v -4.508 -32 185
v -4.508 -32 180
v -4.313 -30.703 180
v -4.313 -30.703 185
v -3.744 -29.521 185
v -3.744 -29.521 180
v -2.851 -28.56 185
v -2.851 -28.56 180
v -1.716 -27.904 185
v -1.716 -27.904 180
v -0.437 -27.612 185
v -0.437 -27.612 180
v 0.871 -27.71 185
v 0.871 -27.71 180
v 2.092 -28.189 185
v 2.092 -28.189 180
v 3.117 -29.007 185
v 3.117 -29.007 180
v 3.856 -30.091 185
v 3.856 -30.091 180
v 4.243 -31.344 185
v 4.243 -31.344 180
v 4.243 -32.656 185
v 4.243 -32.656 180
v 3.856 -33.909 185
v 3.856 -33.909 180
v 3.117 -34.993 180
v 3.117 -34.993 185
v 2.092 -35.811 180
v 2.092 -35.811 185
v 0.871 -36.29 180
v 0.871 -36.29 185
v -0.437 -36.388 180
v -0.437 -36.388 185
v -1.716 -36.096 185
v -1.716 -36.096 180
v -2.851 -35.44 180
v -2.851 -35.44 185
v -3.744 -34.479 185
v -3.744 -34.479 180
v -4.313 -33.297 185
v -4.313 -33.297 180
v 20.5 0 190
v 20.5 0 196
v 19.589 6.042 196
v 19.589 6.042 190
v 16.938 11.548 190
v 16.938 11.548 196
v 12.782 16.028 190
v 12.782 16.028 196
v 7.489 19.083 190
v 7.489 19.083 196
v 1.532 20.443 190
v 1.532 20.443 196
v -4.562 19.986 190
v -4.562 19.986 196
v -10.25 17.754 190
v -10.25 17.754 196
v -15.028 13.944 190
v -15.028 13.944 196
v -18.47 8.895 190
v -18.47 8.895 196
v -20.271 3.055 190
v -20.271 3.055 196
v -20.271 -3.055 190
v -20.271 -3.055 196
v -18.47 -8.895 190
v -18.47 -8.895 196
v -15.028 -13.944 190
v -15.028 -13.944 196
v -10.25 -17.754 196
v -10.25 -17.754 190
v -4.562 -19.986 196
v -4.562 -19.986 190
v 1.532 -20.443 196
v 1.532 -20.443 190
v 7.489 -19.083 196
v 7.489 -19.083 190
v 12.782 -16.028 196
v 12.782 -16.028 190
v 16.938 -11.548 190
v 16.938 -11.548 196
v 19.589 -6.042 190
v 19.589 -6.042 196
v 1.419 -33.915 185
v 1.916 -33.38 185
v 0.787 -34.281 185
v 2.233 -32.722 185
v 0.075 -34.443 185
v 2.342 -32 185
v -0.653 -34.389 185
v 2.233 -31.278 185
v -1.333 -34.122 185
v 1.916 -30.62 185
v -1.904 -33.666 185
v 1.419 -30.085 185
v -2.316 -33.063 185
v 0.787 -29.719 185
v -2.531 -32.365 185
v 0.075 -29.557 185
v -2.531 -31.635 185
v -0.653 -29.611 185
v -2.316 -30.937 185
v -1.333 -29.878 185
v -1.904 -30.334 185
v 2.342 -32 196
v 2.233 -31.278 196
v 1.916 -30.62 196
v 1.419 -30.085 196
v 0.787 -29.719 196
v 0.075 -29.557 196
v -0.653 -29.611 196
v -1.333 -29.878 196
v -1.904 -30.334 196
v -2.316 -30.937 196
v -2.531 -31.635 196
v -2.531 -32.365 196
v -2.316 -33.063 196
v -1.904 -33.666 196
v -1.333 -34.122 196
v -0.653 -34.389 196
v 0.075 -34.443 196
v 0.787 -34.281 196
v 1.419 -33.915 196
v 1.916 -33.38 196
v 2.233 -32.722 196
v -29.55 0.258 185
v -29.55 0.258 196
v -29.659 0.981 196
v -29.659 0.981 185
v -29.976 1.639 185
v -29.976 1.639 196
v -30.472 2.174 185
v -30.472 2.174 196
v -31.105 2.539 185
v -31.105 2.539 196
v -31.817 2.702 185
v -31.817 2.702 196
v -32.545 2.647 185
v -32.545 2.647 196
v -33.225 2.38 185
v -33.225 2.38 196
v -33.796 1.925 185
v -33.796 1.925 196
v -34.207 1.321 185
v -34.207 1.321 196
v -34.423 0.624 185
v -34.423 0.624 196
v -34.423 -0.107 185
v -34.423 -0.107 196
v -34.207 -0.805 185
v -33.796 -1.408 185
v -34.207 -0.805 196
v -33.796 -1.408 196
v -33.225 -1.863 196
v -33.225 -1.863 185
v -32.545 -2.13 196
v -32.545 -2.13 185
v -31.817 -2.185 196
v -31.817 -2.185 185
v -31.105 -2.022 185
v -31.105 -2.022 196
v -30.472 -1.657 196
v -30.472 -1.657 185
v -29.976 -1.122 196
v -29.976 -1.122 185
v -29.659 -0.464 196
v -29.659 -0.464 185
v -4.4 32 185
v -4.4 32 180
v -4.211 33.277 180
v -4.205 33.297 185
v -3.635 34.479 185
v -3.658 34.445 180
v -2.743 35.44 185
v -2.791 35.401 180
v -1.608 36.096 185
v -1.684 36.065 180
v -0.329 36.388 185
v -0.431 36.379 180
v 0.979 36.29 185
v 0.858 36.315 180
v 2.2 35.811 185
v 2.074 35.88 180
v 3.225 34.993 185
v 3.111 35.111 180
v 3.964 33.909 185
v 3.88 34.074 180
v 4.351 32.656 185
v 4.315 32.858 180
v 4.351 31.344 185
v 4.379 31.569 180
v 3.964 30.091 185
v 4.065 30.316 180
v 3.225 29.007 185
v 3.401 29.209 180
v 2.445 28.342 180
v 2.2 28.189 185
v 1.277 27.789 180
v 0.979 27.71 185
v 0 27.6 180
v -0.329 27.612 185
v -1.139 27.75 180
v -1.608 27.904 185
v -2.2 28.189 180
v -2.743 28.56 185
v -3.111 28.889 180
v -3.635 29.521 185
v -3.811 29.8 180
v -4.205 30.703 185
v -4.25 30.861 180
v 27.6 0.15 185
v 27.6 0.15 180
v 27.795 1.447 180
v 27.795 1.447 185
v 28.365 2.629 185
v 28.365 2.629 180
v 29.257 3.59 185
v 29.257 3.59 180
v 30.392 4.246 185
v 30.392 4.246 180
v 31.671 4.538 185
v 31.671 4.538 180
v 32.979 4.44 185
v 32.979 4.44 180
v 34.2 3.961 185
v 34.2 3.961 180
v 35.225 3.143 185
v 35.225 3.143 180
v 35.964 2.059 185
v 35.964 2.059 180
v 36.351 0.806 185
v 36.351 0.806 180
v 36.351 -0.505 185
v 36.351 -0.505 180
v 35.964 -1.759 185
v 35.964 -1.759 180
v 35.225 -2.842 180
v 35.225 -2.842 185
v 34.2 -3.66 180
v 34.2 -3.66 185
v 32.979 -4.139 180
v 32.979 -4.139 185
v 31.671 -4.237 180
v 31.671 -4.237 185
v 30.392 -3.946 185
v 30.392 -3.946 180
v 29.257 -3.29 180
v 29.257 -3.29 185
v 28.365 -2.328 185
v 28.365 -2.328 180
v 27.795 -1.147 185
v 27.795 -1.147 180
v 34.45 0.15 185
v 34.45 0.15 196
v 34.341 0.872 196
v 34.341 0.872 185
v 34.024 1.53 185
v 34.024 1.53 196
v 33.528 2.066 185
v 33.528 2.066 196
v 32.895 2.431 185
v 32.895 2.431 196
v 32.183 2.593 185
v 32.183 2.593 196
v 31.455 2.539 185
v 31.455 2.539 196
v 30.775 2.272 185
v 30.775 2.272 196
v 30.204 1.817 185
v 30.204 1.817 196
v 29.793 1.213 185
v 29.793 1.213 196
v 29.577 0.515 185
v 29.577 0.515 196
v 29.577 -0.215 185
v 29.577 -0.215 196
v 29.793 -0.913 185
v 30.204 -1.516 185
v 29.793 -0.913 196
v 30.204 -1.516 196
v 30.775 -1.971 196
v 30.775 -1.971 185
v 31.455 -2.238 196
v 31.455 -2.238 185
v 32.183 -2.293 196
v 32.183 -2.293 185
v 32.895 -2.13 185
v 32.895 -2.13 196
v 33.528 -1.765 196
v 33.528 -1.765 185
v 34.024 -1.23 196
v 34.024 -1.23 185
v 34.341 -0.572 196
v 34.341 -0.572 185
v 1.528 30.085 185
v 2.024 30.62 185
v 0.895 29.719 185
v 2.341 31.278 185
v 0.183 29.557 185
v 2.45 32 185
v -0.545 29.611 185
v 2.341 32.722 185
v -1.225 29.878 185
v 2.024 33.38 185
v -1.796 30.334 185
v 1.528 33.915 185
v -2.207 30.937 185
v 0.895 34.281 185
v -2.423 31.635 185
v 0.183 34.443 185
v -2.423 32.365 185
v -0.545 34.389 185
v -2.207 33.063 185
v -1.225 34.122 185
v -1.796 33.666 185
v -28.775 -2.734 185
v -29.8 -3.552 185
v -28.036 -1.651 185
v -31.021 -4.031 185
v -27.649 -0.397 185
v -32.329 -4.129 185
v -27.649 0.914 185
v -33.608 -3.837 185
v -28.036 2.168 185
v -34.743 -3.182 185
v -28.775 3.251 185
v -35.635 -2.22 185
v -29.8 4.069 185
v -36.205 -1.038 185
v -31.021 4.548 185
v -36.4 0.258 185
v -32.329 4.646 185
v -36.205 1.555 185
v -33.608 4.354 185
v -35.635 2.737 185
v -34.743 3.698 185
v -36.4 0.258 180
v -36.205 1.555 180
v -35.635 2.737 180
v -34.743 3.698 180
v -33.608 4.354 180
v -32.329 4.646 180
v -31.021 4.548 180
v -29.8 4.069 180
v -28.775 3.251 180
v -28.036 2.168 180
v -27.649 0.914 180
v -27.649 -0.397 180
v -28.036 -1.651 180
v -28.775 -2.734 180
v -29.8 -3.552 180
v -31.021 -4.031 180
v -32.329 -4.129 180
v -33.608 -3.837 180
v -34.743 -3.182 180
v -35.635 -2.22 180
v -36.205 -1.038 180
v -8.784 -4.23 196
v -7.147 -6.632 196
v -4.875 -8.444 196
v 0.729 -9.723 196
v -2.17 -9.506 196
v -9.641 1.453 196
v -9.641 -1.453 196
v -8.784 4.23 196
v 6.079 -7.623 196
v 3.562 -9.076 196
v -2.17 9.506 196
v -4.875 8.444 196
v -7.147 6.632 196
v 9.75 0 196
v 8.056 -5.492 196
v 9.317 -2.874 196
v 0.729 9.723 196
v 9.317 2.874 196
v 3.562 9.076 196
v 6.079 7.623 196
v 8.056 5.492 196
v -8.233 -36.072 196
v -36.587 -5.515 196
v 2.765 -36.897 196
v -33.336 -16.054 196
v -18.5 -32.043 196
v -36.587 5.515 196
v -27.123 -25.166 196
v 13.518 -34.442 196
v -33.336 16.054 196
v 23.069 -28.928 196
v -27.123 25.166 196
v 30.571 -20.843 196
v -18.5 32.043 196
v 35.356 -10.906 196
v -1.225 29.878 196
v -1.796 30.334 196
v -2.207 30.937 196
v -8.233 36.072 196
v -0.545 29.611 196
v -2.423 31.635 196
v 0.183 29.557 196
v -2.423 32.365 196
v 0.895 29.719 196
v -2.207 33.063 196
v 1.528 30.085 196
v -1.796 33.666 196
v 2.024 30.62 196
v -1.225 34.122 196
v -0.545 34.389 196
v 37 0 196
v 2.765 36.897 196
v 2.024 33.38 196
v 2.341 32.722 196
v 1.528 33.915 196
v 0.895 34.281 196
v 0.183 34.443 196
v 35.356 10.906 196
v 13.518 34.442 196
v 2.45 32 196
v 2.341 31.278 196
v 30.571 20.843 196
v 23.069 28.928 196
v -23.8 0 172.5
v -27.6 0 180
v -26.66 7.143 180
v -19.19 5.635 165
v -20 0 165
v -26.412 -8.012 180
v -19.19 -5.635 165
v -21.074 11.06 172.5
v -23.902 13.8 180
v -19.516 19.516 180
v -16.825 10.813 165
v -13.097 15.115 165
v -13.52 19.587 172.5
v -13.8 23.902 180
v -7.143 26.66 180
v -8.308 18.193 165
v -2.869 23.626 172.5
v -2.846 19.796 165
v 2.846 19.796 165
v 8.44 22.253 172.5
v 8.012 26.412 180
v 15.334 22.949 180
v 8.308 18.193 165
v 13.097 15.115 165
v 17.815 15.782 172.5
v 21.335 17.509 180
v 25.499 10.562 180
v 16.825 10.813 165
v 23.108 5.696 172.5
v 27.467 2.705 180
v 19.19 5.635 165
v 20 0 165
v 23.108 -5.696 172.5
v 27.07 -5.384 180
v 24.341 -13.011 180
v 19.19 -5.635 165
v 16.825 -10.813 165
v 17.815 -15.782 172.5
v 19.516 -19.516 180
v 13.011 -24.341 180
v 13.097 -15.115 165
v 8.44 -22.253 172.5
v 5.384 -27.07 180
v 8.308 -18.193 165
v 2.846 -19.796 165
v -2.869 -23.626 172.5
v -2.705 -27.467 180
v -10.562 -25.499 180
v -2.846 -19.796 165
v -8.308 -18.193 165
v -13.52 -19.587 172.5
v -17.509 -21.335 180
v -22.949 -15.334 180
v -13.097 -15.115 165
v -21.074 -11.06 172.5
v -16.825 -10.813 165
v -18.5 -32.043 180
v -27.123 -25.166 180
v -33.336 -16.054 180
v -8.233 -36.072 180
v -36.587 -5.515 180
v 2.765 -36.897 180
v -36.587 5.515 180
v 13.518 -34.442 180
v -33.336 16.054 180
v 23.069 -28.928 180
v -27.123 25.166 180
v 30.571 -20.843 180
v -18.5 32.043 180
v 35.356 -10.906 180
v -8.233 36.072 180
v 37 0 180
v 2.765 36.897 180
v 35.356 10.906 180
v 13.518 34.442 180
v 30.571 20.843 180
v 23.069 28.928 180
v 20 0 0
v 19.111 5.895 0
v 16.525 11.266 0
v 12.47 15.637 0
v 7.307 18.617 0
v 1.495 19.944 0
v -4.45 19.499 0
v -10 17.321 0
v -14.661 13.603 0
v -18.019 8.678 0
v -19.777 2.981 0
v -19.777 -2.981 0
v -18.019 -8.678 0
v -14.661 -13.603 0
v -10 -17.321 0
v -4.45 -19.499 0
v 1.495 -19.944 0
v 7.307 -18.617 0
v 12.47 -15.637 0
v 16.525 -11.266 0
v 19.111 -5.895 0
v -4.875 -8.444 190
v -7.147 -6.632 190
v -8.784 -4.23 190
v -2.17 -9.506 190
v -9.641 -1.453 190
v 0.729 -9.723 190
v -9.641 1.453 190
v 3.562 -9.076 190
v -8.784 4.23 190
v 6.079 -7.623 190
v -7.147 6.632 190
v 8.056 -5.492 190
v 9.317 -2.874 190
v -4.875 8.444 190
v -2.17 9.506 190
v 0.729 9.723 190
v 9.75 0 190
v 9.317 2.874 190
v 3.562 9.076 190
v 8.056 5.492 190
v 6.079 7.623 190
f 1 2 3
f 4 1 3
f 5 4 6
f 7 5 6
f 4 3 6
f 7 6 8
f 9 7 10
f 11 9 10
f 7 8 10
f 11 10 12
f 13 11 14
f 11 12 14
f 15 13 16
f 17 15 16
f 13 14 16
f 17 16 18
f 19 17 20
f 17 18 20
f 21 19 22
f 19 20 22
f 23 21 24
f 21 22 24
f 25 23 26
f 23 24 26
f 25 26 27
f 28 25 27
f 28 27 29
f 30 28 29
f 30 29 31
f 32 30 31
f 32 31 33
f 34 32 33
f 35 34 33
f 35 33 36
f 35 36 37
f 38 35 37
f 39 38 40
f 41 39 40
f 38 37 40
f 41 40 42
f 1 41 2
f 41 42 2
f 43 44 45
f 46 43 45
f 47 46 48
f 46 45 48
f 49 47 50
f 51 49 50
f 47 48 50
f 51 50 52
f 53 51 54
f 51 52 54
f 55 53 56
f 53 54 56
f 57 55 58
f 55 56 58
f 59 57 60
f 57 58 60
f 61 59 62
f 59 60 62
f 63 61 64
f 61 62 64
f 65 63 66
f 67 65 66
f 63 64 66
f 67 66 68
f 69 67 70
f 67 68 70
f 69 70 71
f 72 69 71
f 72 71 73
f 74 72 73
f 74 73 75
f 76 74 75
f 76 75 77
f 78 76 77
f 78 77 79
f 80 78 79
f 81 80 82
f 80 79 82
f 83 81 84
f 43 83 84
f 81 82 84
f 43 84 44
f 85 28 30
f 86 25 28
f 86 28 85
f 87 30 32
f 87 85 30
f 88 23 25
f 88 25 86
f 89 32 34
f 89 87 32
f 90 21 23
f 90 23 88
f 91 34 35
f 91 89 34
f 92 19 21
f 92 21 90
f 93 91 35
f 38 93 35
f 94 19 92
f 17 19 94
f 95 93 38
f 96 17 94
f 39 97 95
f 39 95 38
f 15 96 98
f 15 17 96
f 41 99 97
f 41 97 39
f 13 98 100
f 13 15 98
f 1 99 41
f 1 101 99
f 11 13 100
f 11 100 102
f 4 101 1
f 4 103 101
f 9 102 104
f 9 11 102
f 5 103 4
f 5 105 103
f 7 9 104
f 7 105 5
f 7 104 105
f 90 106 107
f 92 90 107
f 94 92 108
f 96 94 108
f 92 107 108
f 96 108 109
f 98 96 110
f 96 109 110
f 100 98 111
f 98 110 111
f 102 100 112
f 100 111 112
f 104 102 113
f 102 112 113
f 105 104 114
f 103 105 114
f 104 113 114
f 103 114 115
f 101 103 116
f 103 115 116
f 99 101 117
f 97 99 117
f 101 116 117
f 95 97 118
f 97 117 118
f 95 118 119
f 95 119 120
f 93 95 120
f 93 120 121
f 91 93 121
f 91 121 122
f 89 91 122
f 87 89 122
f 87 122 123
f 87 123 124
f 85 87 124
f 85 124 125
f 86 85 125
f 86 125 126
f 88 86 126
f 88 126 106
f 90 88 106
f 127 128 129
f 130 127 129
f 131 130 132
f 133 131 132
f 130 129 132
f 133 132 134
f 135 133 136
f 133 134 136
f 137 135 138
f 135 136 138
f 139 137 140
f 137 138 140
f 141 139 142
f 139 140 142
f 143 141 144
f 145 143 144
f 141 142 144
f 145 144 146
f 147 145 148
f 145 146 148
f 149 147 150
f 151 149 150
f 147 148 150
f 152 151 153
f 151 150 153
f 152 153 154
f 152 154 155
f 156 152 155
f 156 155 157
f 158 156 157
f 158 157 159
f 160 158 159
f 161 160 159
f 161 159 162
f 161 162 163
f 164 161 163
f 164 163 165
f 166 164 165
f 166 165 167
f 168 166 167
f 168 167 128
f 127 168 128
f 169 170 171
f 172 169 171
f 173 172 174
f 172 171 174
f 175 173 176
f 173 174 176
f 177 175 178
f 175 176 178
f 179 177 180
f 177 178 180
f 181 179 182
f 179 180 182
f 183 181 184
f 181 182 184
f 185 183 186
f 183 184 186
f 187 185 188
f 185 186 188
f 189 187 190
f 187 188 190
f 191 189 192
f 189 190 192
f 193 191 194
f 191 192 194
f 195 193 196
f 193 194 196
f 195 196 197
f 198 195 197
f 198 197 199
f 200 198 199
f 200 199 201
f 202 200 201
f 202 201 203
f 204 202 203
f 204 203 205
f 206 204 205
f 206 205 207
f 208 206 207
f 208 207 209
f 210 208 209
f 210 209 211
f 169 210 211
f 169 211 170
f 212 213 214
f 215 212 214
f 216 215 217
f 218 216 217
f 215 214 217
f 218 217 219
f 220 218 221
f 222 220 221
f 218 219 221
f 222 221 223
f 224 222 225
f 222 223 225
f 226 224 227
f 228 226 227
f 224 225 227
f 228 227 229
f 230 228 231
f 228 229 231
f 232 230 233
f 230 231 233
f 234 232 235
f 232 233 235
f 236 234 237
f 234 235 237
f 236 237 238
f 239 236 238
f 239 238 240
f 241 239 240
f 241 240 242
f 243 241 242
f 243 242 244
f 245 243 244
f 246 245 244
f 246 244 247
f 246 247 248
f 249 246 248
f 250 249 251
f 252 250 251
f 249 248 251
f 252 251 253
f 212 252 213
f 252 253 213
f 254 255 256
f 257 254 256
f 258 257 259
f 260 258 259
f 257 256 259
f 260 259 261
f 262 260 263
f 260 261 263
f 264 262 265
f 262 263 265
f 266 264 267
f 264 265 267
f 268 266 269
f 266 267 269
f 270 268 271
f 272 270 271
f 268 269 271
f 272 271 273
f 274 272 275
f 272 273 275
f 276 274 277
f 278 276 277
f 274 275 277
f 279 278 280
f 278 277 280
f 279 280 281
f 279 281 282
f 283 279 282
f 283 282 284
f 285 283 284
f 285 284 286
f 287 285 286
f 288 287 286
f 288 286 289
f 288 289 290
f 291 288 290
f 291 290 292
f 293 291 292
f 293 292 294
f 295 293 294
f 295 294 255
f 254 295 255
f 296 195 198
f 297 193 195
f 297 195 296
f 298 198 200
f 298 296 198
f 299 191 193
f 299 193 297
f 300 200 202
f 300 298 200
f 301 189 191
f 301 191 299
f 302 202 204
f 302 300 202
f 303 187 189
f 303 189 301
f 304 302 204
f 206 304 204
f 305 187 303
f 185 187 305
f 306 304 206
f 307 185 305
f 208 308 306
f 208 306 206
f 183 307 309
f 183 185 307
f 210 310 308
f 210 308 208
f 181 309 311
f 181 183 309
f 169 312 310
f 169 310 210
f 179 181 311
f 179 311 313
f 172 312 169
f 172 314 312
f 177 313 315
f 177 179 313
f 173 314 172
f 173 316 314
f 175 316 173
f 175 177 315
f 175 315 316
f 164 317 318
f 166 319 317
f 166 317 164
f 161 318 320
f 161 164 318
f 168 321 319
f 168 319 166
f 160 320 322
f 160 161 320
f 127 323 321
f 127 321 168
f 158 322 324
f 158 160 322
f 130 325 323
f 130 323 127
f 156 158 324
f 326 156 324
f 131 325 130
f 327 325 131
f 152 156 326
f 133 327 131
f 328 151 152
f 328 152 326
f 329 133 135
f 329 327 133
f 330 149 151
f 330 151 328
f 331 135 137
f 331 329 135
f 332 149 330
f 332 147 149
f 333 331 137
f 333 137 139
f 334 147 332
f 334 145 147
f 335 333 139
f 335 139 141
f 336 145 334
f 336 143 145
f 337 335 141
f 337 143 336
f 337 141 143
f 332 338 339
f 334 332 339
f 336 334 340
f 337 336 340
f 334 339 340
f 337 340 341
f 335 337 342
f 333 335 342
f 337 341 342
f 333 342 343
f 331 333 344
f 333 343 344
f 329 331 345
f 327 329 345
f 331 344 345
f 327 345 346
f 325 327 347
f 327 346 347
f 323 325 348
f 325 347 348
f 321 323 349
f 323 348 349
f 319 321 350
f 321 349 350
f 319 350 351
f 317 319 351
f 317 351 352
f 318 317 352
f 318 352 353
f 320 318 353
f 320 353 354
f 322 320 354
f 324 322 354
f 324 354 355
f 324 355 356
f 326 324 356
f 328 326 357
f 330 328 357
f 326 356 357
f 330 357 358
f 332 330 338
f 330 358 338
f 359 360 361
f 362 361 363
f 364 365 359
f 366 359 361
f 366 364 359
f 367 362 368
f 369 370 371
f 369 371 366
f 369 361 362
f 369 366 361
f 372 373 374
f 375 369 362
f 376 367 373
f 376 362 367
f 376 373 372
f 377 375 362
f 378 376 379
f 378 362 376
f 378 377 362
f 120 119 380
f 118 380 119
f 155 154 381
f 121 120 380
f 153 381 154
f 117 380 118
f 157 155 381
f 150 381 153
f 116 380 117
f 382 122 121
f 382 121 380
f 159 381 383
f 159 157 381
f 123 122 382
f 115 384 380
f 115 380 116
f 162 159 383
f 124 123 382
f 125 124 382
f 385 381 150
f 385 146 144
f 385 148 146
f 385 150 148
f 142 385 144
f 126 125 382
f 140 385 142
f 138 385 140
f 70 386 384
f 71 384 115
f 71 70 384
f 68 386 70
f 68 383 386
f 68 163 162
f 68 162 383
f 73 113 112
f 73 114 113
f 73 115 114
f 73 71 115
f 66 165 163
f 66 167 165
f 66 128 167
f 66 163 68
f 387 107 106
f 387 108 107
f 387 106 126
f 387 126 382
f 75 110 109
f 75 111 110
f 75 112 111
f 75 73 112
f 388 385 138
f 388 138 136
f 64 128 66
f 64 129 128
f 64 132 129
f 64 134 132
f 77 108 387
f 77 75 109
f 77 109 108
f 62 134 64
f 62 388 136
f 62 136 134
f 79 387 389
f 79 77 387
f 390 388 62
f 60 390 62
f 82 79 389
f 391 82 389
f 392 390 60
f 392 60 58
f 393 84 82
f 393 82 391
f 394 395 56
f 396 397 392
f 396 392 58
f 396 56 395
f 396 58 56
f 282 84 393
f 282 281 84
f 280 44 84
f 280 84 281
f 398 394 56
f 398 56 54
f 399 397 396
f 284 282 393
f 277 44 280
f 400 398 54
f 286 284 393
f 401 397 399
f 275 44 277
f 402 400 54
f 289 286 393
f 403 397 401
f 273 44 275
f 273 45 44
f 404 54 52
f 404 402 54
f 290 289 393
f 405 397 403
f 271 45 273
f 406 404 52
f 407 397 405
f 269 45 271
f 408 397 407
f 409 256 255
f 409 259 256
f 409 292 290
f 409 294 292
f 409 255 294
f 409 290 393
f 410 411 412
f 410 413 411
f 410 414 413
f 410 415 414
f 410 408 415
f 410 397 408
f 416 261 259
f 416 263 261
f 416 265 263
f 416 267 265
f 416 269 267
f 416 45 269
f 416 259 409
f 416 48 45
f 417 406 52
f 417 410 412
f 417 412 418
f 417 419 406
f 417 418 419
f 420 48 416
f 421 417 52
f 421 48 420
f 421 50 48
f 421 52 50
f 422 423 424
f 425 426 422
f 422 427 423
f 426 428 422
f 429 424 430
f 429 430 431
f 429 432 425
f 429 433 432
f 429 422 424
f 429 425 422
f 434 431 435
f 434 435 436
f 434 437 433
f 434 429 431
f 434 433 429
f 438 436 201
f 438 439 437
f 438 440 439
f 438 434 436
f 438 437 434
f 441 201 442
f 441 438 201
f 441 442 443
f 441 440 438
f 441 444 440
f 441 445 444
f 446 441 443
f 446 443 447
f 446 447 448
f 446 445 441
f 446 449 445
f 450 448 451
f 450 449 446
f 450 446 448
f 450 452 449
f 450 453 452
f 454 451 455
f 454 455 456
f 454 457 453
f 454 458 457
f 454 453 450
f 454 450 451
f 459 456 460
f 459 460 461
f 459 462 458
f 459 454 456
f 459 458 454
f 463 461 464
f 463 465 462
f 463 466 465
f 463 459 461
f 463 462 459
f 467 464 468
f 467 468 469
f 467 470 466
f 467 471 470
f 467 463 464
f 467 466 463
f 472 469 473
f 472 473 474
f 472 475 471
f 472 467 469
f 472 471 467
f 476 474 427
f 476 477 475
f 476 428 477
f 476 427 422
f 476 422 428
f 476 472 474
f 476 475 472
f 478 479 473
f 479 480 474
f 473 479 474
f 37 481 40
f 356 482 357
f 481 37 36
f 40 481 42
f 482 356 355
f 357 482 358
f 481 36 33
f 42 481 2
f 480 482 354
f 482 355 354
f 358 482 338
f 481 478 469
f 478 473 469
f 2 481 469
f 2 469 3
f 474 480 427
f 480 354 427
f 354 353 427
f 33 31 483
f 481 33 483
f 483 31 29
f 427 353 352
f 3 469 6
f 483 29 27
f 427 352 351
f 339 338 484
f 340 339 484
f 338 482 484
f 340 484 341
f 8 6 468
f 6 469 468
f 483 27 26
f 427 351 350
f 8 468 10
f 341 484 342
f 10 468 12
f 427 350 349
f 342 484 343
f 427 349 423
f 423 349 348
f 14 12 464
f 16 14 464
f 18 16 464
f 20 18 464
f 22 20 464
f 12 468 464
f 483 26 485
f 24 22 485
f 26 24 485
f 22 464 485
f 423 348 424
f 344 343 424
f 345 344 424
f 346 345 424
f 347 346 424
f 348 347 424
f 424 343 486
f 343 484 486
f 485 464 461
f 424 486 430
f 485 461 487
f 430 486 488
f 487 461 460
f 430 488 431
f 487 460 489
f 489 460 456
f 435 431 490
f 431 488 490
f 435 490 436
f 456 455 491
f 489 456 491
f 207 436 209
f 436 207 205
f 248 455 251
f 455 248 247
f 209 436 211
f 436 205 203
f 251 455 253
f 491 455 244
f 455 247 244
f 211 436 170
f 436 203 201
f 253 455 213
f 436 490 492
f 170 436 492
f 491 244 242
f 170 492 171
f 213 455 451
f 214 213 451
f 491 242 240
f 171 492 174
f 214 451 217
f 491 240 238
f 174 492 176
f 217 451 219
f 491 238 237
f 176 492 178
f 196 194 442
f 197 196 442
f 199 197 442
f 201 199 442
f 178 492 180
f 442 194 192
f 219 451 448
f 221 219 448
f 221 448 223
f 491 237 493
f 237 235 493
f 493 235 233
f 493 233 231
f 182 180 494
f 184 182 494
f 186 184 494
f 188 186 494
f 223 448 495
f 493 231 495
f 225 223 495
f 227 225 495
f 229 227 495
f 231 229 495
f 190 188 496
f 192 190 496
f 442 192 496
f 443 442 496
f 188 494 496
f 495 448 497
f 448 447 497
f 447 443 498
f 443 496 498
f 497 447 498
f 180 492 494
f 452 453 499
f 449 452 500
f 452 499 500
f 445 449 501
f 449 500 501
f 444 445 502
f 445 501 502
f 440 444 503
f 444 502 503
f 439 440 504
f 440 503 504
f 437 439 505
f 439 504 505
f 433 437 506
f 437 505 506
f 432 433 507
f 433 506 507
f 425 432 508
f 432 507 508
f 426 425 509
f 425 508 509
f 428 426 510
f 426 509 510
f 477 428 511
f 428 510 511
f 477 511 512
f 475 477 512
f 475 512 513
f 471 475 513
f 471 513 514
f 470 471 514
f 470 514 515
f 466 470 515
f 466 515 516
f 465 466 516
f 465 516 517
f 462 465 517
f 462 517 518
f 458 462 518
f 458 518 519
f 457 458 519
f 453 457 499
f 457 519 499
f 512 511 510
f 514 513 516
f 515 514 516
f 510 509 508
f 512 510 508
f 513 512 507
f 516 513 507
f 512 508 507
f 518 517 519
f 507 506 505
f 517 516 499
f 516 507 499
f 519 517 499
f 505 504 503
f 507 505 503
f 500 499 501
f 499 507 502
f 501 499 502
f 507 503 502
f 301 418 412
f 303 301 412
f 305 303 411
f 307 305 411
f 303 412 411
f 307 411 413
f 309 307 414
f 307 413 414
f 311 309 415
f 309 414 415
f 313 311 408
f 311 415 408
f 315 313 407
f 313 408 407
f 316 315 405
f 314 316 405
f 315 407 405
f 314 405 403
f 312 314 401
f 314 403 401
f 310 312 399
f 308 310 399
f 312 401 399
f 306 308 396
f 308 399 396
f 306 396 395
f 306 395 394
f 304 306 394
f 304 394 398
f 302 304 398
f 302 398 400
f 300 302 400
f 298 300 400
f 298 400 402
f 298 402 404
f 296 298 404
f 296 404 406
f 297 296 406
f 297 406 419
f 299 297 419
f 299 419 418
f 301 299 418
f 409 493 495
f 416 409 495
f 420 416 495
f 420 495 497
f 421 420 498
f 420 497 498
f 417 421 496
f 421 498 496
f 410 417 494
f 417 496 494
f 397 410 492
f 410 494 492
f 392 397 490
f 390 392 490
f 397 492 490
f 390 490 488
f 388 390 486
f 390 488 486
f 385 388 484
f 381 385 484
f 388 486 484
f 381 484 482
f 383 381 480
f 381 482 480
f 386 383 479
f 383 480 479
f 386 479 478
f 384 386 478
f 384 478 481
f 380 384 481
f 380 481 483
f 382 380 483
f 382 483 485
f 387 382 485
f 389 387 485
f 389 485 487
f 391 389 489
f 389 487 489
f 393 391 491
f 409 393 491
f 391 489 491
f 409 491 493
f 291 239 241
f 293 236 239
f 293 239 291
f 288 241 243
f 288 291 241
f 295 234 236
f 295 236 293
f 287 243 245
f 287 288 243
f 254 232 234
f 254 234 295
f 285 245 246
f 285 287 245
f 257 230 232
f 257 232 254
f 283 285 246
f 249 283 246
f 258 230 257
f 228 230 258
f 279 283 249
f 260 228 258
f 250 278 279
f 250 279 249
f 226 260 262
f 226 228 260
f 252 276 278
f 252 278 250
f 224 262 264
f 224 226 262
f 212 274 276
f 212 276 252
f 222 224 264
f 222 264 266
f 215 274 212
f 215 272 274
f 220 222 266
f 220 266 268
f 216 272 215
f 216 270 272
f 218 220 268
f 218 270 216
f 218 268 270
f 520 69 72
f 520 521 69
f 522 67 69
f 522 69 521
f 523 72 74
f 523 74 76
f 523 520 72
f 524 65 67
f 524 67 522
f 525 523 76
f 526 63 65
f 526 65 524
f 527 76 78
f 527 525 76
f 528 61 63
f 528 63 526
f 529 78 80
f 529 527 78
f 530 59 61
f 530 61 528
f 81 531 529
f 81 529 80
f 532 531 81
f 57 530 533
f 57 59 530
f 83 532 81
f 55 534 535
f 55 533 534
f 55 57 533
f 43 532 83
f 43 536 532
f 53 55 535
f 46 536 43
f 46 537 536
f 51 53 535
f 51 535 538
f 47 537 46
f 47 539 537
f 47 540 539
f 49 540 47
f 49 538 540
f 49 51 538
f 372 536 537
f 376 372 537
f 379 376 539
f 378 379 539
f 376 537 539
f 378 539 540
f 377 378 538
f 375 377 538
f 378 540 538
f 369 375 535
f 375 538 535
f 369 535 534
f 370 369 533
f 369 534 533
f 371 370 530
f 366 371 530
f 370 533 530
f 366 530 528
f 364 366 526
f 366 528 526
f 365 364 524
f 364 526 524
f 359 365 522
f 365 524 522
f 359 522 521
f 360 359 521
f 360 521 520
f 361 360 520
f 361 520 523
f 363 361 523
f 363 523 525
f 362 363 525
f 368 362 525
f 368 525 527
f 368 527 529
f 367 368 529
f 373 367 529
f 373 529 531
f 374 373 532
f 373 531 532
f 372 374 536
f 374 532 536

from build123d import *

# Parameters (mm, degrees)
SKETCH_1_R          = 20
EXTRUDE_1_DEPTH     = 180
SKETCH_3_R          = 37
EXTRUDE_3_DEPTH     = 16
SKETCH_4_R          = 20.5
CUT_EXTRUDE_1_DEPTH = 6
SKETCH_5_R          = 9.75
EXTRUDE_4_DEPTH     = 6
CUT_EXTRUDE_3_REACH = 198
SKETCH_10_R         = 2.45
SKETCH_18_R         = 4.4
CUT_EXTRUDE_4_DEPTH = 5


with BuildPart() as part:
    # 스케치1 → 보스-돌출1 (new body)
    with BuildSketch(Plane.XY):
        Circle(SKETCH_1_R)
    extrude(amount=EXTRUDE_1_DEPTH)

    # 스케치3 → 보스-돌출3 (add)
    with BuildSketch(Plane.XY.offset(180)):
        Circle(SKETCH_3_R)
    extrude(amount=EXTRUDE_3_DEPTH)

    # 스케치4 → 컷-돌출1 (cut)
    with BuildSketch(Plane.XY.offset(196)):
        Circle(SKETCH_4_R)
    extrude(amount=-CUT_EXTRUDE_1_DEPTH, mode=Mode.SUBTRACT)

    # 스케치5 → 보스-돌출4 (add)
    with BuildSketch(Plane.XY.offset(190)):
        Circle(SKETCH_5_R)
    extrude(amount=EXTRUDE_4_DEPTH)

    # 스케치10 → 컷-돌출3 (cut, up to next)
    with BuildSketch(Plane.XY.offset(196), mode=Mode.PRIVATE) as cut_extrude_3_sk1:
        with Locations((0, 32)):
            Circle(SKETCH_10_R)
    cut_extrude_3_tool1 = extrude(cut_extrude_3_sk1.sketch, amount=-CUT_EXTRUDE_3_REACH, mode=Mode.PRIVATE) & part.part
    add(cut_extrude_3_tool1.solids().sort_by_distance((0, 32, 196))[0], mode=Mode.SUBTRACT)
    # 스케치10 → 컷-돌출3 (cut, up to next)
    with BuildSketch(Plane.XY.offset(196), mode=Mode.PRIVATE) as cut_extrude_3_sk2:
        with Locations((32, 0.150294809)):
            Circle(SKETCH_10_R)
    cut_extrude_3_tool2 = extrude(cut_extrude_3_sk2.sketch, amount=-CUT_EXTRUDE_3_REACH, mode=Mode.PRIVATE) & part.part
    add(cut_extrude_3_tool2.solids().sort_by_distance((32, 0.150295, 196))[0], mode=Mode.SUBTRACT)
    # 스케치10 → 컷-돌출3 (cut, up to next)
    with BuildSketch(Plane.XY.offset(196), mode=Mode.PRIVATE) as cut_extrude_3_sk3:
        with Locations((-32, 0.258434211)):
            Circle(SKETCH_10_R)
    cut_extrude_3_tool3 = extrude(cut_extrude_3_sk3.sketch, amount=-CUT_EXTRUDE_3_REACH, mode=Mode.PRIVATE) & part.part
    add(cut_extrude_3_tool3.solids().sort_by_distance((-32, 0.258434, 196))[0], mode=Mode.SUBTRACT)
    # 스케치10 → 컷-돌출3 (cut, up to next)
    with BuildSketch(Plane.XY.offset(196), mode=Mode.PRIVATE) as cut_extrude_3_sk4:
        with Locations((-0.108139402, -32)):
            Circle(SKETCH_10_R)
    cut_extrude_3_tool4 = extrude(cut_extrude_3_sk4.sketch, amount=-CUT_EXTRUDE_3_REACH, mode=Mode.PRIVATE) & part.part
    add(cut_extrude_3_tool4.solids().sort_by_distance((-0.108139, -32, 196))[0], mode=Mode.SUBTRACT)

    # 스케치18 → 컷-돌출4 (cut)
    with BuildSketch(Plane(origin=(0, 0, 180), x_dir=(-1, 0, 0), z_dir=(0, 0, -1))):
        with Locations((0, 32)):
            Circle(SKETCH_18_R)
        with Locations((32, 0.258434211)):
            Circle(SKETCH_18_R)
        with Locations((0.108139402, -32)):
            Circle(SKETCH_18_R)
        with Locations((-32, 0.150294809)):
            Circle(SKETCH_18_R)
    extrude(amount=-CUT_EXTRUDE_4_DEPTH, mode=Mode.SUBTRACT)

    # 스케치20 → 회전1 (revolve)
    with BuildSketch(Plane(origin=(0, 0, 0), x_dir=(1, 0, 0), z_dir=(0, 1, 0))):
        Polygon((-20, -180), (-27.6, -180), (-20, -165), align=None)
    revolve(axis=Axis((0, 0, 180), (0, 0, -1)))


solid = part.part
